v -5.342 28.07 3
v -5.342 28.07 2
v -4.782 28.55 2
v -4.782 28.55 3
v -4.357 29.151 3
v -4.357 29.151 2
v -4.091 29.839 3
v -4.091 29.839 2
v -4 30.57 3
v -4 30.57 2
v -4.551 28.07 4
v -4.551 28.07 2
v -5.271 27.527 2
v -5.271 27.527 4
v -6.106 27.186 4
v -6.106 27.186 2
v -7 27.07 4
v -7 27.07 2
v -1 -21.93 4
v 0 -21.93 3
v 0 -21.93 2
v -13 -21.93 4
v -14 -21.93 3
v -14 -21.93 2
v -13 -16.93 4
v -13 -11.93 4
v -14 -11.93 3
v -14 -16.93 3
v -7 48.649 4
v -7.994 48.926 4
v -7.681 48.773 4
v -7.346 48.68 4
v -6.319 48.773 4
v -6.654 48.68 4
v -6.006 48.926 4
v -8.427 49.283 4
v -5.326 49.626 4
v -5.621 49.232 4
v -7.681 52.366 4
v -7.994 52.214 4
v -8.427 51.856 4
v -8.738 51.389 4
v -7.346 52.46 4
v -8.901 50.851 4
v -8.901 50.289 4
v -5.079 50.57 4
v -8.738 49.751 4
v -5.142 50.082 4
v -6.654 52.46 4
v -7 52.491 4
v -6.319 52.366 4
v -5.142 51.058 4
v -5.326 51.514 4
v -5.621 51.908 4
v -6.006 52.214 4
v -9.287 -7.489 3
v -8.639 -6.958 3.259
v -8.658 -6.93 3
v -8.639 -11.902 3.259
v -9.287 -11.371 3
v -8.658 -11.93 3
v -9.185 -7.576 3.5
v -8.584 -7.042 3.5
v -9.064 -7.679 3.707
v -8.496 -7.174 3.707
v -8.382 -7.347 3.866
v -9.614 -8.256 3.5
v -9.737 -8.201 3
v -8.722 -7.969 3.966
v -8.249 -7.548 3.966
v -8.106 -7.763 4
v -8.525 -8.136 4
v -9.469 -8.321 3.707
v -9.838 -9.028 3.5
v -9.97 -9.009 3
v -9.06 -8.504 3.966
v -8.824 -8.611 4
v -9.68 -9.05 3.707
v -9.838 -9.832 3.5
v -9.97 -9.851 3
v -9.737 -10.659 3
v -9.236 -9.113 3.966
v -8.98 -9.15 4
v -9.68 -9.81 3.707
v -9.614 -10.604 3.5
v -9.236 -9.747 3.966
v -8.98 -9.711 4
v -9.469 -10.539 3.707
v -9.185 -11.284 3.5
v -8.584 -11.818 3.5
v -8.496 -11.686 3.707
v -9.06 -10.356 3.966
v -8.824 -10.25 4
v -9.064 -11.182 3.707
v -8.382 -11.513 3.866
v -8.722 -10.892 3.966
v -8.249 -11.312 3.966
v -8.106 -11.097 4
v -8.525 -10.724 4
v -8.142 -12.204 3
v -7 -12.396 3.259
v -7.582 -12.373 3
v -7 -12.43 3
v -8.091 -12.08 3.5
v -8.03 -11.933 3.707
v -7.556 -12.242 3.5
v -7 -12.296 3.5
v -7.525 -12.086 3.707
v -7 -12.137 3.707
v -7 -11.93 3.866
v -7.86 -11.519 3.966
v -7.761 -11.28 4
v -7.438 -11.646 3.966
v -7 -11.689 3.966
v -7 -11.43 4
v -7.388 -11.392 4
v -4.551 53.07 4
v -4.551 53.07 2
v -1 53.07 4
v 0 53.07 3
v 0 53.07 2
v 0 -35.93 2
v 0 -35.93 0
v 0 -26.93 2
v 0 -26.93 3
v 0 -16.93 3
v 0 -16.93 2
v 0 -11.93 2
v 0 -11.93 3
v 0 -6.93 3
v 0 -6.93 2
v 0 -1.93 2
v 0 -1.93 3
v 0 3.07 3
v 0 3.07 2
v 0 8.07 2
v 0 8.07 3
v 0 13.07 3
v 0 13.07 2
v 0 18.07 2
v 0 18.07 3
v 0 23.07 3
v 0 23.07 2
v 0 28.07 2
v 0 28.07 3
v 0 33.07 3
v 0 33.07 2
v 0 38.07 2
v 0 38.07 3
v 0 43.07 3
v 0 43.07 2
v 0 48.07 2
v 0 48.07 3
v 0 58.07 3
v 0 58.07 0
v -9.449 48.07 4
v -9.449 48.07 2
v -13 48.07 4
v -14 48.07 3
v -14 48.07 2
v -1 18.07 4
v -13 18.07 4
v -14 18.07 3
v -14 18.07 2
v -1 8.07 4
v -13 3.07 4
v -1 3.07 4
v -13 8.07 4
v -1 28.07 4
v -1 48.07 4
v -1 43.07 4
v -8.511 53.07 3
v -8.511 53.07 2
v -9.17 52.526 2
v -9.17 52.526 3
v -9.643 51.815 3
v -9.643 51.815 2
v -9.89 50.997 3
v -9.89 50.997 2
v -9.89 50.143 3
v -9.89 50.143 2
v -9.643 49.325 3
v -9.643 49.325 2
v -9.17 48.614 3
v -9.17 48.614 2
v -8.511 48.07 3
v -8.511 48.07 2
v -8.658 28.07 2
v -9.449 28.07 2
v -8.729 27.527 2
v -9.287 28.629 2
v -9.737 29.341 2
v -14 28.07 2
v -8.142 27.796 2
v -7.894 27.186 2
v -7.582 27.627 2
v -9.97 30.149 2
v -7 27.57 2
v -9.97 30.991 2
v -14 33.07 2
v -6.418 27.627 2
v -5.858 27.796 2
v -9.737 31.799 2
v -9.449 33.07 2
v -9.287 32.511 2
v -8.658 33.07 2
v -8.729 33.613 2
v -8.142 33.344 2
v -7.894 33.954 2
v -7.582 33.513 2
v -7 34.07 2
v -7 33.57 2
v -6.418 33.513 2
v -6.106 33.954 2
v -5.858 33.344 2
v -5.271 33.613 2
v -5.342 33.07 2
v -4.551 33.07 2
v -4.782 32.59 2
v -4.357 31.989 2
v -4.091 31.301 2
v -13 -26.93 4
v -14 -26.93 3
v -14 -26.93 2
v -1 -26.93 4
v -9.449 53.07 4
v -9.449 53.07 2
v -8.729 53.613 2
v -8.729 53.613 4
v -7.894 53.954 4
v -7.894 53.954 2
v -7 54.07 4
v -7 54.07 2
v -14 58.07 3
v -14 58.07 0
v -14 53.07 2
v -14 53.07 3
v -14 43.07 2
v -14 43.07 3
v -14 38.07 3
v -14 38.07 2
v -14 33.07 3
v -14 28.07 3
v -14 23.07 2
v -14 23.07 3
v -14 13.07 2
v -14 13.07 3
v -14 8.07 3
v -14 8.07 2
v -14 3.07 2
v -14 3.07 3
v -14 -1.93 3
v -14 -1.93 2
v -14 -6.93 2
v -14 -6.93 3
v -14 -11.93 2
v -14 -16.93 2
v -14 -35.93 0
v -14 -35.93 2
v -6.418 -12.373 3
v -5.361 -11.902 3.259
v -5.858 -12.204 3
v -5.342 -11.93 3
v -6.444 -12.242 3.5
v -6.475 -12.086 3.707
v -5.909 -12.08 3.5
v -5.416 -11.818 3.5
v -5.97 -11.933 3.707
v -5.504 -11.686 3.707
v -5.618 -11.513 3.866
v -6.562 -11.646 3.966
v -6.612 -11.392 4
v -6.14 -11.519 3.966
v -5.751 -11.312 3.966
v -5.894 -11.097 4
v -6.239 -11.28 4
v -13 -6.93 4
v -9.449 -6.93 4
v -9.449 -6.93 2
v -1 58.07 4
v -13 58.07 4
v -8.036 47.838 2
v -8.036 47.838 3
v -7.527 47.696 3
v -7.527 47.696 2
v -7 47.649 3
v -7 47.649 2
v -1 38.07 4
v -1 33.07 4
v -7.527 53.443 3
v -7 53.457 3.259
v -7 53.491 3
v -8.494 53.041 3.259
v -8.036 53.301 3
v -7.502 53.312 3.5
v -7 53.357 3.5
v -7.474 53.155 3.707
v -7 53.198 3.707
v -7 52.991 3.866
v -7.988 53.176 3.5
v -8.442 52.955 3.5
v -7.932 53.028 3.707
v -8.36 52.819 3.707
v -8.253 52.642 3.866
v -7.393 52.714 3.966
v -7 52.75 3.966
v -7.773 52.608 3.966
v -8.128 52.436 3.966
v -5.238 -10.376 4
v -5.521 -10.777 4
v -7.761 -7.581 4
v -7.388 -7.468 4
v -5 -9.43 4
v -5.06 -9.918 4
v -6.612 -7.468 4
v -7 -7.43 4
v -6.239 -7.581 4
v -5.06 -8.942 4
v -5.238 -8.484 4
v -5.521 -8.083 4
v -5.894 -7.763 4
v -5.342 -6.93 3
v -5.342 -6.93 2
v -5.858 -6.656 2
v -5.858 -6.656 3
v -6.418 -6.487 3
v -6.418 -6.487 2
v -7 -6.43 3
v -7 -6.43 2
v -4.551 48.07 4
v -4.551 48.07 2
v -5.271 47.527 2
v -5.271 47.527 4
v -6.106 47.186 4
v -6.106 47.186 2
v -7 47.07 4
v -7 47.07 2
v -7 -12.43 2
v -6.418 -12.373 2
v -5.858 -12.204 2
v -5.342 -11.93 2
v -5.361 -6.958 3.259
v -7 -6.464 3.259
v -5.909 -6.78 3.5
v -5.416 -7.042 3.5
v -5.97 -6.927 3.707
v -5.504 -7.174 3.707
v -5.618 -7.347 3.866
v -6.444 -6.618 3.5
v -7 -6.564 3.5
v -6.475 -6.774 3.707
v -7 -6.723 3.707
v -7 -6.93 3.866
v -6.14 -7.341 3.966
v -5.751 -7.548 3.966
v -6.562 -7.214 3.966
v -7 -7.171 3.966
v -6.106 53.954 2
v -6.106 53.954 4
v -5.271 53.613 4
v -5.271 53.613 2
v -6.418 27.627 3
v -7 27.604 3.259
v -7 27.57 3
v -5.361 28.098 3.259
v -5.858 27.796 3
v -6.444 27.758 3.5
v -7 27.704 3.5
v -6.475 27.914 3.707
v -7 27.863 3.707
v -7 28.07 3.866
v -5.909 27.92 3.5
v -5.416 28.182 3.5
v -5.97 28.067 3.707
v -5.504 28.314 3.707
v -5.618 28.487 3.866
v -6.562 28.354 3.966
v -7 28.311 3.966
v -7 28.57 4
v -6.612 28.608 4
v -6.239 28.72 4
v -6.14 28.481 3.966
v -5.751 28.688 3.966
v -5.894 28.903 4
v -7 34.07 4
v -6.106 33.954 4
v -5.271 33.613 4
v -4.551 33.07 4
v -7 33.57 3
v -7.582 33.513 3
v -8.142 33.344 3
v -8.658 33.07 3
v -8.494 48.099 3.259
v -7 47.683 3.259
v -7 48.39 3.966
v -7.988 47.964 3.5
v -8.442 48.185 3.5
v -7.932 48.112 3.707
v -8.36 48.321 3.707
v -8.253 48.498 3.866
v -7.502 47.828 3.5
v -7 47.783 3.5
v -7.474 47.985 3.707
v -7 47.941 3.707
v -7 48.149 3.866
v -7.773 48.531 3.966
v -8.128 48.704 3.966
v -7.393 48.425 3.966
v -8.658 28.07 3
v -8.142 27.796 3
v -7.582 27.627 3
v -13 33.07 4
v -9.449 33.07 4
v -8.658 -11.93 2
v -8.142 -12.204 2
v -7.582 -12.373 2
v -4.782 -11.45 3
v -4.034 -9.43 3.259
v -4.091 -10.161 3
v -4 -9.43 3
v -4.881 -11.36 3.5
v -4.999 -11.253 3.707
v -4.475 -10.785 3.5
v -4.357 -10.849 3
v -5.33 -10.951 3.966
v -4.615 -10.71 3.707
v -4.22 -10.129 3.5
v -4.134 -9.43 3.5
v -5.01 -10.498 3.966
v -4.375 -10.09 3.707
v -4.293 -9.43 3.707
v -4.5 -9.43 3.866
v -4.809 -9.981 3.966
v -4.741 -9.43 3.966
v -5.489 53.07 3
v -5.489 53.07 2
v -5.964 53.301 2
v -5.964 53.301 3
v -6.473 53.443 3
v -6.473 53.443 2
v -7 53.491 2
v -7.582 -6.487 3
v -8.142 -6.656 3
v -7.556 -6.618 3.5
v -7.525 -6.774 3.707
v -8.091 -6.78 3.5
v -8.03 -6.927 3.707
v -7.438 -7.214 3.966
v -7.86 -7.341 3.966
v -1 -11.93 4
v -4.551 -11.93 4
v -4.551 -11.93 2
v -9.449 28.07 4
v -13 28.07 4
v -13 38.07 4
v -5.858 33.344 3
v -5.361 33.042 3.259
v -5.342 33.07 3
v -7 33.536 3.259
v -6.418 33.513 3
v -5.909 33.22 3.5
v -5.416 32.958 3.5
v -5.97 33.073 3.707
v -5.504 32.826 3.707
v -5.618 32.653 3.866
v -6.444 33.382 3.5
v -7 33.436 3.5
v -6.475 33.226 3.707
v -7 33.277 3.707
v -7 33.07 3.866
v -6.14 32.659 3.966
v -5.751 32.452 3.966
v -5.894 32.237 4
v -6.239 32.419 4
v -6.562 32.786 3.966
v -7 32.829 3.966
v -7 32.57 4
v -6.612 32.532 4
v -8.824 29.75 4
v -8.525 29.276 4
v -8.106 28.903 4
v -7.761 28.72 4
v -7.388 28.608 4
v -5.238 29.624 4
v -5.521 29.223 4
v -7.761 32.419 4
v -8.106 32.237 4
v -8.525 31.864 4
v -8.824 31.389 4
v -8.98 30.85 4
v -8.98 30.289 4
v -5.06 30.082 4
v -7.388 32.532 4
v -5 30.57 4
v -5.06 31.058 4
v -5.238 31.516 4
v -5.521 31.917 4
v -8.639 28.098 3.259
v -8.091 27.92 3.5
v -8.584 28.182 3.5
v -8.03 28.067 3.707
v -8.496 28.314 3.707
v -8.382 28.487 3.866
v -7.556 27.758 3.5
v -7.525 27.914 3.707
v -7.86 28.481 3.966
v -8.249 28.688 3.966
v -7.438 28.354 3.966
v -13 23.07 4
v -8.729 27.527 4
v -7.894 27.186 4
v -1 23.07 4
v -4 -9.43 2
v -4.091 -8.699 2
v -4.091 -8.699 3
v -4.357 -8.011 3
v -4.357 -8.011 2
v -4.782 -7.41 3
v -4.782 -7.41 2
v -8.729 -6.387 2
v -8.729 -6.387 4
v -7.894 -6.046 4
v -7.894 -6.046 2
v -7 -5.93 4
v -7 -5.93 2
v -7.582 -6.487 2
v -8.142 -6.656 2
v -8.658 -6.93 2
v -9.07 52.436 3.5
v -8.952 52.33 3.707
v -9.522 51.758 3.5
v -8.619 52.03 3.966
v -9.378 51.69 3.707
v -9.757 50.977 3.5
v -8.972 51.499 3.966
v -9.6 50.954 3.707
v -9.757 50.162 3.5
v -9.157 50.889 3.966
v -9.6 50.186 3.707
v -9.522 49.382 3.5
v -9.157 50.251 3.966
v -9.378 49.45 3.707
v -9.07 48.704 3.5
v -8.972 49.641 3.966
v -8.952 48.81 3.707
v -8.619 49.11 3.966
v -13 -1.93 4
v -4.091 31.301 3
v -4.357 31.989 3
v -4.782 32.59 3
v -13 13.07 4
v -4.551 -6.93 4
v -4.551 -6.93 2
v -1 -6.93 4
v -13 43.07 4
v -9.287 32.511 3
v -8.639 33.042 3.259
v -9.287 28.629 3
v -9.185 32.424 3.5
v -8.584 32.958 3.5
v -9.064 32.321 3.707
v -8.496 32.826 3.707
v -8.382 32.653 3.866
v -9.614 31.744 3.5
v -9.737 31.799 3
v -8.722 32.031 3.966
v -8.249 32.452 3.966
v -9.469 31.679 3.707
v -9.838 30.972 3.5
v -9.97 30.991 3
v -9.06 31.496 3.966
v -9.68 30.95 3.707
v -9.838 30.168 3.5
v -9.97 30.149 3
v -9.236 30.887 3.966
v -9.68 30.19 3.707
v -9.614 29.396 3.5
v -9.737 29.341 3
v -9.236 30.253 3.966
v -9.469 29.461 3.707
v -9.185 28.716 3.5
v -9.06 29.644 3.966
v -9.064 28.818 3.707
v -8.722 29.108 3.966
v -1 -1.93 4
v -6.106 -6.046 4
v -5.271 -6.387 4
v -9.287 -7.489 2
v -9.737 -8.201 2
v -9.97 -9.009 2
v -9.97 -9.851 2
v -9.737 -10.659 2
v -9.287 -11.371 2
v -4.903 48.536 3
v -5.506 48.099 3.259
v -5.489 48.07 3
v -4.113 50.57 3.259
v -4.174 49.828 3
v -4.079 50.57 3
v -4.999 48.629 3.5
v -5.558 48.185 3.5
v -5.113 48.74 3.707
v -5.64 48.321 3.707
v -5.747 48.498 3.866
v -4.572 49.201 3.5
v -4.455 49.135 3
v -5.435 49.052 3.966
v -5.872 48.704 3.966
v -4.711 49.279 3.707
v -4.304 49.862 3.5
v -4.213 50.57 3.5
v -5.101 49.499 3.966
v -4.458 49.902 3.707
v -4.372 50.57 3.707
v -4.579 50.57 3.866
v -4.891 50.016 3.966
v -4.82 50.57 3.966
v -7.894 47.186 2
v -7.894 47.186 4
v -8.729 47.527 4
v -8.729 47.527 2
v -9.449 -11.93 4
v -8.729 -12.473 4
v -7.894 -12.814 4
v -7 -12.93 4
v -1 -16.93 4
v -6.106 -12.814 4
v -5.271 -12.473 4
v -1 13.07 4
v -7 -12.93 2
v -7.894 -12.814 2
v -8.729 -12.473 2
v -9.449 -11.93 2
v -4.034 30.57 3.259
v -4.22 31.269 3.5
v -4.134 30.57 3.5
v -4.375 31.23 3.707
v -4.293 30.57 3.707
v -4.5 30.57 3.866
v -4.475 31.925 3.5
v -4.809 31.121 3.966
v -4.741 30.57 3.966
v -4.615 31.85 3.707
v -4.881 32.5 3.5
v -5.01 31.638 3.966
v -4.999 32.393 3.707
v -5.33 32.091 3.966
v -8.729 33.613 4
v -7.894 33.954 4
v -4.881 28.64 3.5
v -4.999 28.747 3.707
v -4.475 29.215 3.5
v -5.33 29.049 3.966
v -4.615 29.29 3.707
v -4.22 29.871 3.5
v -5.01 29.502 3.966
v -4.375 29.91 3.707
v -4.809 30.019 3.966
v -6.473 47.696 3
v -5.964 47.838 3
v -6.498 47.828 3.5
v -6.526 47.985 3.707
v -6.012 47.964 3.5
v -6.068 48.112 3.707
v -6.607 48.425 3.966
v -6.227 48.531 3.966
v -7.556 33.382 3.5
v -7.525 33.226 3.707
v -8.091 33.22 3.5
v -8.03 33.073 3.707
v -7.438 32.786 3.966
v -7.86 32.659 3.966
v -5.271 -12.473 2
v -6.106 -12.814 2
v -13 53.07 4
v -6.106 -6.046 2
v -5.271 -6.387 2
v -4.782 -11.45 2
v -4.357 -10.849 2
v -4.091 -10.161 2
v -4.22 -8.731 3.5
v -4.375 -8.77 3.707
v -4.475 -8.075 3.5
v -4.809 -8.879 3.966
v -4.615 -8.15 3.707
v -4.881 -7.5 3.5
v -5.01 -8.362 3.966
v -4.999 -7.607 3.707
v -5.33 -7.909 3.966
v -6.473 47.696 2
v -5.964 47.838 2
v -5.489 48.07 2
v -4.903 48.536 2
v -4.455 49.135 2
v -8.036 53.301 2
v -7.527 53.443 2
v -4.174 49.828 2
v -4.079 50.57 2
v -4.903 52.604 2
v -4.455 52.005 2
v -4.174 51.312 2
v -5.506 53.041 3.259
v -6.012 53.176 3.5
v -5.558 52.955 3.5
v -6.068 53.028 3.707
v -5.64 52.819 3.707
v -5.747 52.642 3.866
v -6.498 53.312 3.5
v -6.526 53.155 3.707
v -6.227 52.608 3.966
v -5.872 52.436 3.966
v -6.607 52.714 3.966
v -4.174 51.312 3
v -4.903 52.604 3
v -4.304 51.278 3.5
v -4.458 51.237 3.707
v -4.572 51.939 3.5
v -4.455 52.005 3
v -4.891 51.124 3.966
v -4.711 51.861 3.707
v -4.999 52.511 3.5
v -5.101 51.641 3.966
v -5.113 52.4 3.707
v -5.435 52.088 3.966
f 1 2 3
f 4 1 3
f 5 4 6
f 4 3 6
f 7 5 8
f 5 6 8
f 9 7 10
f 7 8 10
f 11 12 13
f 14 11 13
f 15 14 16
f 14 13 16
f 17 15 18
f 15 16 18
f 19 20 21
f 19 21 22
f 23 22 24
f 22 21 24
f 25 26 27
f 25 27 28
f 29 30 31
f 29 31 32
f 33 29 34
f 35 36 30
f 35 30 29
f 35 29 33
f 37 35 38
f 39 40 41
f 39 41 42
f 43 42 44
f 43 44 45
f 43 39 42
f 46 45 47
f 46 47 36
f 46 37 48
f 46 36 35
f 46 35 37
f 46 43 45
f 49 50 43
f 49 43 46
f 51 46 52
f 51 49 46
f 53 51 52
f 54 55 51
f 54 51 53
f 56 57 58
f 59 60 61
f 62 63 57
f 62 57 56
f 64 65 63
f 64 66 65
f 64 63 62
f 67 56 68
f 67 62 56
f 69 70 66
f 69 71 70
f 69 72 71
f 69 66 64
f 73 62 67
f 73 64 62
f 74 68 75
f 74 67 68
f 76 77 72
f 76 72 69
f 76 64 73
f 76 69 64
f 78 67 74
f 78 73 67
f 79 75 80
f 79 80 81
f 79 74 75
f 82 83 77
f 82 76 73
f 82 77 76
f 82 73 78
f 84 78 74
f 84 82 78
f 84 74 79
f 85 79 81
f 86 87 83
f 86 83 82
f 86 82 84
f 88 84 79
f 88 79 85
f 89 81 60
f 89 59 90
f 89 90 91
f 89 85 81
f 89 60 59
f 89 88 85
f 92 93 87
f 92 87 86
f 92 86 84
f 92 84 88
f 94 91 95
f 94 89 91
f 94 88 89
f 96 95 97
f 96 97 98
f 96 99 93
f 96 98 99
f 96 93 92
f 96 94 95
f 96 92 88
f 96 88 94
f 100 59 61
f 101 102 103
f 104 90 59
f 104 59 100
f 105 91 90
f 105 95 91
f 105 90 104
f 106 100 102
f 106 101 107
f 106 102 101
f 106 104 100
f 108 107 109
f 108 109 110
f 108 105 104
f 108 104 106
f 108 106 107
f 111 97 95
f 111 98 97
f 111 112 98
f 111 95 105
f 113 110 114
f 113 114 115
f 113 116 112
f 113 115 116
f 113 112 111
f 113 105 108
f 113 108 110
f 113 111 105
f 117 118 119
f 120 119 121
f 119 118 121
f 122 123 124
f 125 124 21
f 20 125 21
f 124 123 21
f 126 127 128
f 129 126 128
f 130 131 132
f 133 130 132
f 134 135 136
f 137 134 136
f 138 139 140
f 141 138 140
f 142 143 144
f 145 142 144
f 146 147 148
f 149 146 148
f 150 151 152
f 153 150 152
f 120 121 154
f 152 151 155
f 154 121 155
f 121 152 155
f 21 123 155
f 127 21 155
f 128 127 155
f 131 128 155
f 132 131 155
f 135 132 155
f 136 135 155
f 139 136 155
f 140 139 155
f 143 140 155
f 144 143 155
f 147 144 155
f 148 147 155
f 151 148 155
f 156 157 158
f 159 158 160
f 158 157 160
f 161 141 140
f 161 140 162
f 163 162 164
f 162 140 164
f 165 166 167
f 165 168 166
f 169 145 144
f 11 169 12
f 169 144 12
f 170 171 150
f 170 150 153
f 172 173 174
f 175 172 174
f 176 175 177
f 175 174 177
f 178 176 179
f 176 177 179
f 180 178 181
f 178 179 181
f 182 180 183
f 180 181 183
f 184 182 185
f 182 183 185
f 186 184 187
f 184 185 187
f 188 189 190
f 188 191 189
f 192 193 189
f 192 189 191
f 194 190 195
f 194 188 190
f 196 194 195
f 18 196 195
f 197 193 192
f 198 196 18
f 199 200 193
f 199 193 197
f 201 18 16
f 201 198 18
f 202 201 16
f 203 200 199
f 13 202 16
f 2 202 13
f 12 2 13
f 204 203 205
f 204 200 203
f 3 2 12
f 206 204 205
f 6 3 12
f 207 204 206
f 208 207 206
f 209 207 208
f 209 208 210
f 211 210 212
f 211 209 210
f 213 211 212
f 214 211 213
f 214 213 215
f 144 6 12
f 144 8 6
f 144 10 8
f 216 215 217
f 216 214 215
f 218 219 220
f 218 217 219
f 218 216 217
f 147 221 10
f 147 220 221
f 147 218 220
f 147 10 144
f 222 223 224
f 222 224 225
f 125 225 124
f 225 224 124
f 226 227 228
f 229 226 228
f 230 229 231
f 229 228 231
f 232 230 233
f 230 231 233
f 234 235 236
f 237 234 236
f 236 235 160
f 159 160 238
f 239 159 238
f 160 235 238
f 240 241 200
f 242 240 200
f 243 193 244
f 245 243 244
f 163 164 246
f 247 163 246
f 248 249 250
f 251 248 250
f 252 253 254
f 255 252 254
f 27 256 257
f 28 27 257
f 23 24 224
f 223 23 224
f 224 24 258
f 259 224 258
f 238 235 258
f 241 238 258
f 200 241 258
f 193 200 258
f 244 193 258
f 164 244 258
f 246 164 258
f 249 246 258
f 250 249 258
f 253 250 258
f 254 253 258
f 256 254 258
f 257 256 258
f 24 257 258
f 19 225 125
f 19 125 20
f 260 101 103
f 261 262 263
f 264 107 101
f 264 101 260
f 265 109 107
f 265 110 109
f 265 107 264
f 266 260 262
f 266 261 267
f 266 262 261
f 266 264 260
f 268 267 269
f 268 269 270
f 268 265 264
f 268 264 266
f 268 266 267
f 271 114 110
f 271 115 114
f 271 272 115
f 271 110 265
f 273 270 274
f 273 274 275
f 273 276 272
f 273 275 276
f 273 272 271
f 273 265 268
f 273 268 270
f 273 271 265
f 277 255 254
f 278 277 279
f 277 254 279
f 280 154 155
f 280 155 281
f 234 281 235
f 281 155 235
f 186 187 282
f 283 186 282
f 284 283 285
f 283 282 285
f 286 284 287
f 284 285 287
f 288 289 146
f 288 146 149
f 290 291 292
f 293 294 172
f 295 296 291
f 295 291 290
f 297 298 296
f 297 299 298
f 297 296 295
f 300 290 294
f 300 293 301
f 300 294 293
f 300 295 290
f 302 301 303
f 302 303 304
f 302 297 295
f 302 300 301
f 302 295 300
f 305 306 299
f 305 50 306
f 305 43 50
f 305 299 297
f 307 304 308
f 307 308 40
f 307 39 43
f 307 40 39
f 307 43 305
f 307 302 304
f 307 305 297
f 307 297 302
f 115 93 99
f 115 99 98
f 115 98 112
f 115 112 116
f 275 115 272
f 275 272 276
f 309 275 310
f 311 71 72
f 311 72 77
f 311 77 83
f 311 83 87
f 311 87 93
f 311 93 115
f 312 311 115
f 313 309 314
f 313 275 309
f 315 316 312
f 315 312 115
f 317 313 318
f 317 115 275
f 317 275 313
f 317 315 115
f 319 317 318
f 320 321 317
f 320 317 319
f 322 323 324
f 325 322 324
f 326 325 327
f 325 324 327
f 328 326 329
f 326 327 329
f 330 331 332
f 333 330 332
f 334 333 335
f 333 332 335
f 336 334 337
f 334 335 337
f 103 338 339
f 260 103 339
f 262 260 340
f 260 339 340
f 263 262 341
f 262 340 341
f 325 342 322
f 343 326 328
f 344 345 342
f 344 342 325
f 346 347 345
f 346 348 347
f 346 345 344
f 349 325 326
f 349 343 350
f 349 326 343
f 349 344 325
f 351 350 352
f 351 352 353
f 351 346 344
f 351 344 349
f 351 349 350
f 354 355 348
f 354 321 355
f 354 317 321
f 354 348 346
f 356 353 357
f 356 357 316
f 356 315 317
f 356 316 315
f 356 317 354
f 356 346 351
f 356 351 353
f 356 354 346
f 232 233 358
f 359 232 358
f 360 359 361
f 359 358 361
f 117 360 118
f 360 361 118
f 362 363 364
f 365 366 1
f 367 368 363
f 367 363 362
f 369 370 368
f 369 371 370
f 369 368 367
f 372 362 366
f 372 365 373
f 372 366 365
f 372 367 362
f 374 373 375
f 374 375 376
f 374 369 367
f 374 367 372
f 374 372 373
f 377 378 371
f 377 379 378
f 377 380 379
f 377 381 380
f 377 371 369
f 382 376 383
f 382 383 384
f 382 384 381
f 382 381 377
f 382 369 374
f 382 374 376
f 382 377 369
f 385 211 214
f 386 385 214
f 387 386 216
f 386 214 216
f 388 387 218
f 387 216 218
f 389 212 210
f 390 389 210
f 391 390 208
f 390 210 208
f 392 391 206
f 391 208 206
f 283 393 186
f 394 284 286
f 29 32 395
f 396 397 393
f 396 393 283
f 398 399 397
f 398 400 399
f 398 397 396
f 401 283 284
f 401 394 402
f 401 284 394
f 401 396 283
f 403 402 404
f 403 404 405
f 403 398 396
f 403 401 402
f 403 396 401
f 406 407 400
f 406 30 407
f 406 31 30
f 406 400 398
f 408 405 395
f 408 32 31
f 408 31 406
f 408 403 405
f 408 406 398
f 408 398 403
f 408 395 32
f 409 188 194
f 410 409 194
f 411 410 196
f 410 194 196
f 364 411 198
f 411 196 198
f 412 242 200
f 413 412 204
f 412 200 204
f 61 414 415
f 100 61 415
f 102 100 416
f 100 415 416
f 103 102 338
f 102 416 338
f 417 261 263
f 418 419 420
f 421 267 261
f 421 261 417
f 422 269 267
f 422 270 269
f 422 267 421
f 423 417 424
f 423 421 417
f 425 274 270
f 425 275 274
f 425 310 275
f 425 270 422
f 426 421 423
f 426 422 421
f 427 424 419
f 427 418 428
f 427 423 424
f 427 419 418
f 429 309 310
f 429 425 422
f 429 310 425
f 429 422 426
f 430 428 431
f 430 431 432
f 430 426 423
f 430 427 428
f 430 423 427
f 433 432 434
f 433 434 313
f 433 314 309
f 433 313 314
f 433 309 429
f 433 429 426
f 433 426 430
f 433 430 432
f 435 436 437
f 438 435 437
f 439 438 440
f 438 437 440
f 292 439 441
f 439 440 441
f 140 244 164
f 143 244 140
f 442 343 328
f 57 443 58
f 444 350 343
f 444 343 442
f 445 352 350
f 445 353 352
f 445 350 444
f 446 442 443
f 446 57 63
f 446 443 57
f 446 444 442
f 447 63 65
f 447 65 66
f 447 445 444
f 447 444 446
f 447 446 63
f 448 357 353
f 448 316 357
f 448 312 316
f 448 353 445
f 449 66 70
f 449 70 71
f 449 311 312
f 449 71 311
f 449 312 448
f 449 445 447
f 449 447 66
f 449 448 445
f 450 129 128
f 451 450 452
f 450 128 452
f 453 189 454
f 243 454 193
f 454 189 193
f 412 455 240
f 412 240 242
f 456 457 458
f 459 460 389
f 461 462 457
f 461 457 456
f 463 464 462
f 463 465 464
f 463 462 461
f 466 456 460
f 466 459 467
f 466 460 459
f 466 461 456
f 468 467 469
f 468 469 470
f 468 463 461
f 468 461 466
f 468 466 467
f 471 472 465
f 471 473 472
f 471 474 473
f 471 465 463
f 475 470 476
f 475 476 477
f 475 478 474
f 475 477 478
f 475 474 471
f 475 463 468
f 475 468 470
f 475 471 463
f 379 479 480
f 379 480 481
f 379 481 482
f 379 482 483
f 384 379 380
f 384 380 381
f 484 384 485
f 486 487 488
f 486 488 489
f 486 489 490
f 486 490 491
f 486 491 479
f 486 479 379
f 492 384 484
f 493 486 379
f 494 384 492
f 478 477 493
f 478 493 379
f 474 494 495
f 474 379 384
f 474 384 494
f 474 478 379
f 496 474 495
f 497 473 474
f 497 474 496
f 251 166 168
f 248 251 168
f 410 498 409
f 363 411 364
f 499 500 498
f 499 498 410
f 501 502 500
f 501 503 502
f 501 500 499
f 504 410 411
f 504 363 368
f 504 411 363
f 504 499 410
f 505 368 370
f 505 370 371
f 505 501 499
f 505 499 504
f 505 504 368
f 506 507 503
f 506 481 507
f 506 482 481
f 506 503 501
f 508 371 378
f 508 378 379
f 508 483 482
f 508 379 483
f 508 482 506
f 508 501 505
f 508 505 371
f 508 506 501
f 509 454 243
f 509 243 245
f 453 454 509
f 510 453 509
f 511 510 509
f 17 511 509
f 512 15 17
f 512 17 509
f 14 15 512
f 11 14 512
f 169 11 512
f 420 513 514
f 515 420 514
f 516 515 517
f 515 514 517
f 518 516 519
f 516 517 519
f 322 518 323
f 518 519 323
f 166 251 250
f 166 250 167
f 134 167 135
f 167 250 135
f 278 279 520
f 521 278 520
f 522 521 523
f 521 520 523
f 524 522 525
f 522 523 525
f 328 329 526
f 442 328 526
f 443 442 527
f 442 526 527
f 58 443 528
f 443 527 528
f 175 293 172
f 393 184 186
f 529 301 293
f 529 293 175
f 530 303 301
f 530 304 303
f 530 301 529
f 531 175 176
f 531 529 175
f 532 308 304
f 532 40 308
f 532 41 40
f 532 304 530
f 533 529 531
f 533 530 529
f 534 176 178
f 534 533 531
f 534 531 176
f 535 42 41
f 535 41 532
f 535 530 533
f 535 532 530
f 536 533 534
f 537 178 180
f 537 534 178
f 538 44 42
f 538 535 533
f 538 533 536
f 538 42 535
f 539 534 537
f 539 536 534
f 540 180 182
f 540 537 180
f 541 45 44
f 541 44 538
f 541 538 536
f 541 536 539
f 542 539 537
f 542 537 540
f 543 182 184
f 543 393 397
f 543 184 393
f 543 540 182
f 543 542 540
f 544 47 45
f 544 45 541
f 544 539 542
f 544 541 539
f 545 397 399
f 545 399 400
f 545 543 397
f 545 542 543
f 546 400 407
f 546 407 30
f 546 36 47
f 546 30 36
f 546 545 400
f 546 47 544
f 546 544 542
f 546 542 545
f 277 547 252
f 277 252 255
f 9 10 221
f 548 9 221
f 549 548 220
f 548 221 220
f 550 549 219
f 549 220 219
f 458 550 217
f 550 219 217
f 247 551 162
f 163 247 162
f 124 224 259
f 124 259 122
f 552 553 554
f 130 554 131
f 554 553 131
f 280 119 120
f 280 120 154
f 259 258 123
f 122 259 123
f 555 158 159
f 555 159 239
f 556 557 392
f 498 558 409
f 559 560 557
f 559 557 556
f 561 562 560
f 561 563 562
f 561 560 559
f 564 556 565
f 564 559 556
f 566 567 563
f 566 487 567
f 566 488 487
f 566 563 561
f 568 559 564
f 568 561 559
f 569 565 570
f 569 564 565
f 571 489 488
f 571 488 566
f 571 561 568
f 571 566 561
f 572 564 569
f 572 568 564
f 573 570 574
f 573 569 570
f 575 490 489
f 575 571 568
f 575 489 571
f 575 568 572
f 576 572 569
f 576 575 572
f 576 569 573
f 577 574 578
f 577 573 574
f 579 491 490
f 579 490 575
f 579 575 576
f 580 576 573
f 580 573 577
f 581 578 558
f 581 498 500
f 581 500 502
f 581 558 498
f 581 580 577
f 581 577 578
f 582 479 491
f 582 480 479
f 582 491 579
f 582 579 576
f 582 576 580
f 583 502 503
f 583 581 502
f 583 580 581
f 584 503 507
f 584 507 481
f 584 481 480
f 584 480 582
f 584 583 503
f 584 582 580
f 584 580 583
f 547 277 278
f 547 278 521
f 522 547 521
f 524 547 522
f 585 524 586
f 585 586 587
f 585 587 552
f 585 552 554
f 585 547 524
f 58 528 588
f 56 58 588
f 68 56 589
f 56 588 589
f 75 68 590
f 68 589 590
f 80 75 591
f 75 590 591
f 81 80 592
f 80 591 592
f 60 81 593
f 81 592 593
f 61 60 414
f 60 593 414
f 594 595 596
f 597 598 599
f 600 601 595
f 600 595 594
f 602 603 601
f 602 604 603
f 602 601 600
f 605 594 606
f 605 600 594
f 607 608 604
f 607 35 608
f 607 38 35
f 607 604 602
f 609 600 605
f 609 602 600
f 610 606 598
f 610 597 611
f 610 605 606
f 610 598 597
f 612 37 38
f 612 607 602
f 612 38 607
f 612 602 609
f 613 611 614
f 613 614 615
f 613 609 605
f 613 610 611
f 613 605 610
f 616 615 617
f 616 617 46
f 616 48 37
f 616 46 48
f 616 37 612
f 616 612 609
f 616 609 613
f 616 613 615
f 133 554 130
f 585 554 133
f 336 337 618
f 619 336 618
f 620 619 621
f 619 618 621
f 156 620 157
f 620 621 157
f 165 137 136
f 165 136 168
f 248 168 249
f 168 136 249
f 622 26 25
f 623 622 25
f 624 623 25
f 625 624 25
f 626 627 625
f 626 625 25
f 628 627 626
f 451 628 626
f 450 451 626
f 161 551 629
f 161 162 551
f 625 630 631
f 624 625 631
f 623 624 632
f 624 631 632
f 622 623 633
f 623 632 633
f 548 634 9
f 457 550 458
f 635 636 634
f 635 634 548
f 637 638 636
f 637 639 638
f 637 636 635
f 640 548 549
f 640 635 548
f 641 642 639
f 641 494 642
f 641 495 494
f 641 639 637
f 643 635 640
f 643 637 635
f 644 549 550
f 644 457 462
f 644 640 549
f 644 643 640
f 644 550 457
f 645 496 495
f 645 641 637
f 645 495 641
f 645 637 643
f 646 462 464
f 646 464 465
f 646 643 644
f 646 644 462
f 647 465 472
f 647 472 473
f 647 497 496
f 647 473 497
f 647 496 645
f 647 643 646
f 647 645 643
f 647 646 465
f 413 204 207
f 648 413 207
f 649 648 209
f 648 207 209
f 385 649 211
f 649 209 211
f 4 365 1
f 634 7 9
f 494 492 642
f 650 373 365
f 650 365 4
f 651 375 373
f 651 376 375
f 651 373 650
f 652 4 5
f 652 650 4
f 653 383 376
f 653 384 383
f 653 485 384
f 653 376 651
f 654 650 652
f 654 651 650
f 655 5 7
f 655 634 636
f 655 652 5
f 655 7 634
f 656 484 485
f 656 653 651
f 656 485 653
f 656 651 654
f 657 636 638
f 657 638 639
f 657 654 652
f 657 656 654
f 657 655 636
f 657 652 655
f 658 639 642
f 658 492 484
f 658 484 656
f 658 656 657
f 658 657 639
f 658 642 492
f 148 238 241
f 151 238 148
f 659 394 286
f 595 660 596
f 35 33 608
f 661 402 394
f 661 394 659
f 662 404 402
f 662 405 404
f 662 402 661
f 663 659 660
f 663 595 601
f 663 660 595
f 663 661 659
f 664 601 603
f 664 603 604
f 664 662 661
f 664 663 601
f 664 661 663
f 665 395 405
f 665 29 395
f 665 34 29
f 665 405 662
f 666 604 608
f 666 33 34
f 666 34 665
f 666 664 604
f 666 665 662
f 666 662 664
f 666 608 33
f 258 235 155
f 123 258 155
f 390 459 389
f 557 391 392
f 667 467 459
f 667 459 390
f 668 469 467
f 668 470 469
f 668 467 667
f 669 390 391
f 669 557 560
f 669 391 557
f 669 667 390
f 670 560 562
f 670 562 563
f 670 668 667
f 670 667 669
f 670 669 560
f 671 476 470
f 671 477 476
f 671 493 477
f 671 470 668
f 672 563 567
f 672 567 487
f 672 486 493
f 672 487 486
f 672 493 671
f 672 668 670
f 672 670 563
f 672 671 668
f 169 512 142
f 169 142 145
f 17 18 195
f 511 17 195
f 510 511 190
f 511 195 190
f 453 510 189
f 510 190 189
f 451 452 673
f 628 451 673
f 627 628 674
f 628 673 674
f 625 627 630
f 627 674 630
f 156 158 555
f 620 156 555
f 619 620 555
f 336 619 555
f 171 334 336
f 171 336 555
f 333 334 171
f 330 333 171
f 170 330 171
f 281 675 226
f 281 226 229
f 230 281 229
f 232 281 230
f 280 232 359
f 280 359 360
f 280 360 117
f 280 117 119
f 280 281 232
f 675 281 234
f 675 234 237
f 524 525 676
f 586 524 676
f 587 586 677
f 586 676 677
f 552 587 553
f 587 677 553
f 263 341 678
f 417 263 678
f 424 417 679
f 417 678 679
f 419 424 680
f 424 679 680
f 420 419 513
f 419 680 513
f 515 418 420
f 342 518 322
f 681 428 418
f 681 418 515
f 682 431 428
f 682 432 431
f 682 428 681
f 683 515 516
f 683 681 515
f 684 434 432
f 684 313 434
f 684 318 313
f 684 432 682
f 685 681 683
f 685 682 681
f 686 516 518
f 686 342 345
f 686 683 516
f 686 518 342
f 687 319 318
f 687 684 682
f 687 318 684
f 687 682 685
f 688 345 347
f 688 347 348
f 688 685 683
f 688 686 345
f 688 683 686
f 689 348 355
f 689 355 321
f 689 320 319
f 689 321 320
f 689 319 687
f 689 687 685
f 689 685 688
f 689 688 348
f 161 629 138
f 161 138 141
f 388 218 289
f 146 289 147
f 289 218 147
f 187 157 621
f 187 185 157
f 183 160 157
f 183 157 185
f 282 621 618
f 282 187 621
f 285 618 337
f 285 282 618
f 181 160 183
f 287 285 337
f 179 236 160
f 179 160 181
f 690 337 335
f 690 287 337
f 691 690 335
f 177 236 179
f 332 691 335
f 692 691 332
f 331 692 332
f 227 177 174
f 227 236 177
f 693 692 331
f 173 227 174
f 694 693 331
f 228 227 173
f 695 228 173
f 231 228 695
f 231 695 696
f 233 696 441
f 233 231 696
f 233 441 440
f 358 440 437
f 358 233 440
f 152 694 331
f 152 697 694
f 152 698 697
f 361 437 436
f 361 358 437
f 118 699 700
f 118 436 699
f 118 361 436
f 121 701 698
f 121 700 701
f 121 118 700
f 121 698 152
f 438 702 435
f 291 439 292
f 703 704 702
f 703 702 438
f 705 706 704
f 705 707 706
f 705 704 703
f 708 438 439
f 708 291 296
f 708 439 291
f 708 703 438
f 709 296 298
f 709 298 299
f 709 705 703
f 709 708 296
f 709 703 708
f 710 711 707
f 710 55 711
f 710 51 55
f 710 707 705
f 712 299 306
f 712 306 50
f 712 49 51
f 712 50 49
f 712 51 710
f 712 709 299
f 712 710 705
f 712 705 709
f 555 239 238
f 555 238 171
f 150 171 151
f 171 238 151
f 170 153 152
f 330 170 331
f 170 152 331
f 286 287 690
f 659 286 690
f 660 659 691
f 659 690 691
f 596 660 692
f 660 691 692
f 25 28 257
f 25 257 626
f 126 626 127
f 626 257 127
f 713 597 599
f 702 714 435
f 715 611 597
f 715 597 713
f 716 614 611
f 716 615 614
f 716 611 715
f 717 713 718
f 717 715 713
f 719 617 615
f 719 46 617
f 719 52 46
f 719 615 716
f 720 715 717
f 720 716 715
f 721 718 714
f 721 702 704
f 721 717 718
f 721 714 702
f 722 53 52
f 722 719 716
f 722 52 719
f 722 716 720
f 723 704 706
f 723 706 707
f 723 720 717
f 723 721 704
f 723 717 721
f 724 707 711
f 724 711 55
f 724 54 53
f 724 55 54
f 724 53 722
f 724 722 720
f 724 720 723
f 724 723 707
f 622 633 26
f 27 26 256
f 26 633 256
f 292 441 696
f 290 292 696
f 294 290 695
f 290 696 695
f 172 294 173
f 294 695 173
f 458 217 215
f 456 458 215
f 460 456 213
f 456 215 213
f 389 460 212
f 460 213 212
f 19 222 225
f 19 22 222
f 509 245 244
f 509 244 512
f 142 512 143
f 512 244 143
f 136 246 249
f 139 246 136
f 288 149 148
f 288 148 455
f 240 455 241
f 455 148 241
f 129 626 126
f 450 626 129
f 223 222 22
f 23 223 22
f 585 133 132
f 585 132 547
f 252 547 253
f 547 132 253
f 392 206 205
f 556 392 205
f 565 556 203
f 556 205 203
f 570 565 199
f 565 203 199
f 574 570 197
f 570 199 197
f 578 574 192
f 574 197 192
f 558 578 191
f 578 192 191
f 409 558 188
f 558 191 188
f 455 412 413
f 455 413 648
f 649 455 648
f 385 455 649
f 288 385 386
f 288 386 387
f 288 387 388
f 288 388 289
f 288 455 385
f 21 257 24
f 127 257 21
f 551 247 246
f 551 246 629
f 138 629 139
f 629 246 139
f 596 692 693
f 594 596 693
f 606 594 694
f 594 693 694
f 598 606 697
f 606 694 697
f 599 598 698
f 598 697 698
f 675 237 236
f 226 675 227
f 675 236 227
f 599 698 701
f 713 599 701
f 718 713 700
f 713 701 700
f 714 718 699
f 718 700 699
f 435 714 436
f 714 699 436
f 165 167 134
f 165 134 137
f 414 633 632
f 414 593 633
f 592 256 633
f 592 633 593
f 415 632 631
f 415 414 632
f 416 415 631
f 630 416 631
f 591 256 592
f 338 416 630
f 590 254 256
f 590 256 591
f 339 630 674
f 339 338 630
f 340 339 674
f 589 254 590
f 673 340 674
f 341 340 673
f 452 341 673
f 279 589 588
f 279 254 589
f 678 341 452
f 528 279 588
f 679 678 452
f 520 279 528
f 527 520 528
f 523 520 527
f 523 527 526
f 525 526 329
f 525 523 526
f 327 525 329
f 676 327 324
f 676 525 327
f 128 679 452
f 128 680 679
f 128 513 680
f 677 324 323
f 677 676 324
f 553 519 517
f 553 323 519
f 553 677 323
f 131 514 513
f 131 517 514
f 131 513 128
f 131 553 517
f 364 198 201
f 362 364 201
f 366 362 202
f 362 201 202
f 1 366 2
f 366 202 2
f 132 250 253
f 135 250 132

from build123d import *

# Parameters (mm, degrees)
F0_W     = 14
F0_H     = 94
F1_DEPTH = 2
F2_W     = 7
F2_H     = 5
F3_DEPTH = 2
F4_SIZE  = 1
F5_R     = 1


with BuildPart() as f1:
    # F0 (on Top) → F1 (new body)
    with BuildSketch(Plane.XY):
        with Locations((-7, 11.0699324605)):
            Rectangle(F0_W, F0_H)
    extrude(amount=F1_DEPTH)

    # F2 (on face) → F3 (join)
    with BuildSketch(Plane.XY.offset(2)):
        with BuildLine():
            Line((-7, 58.0699324605), (-14, 58.0699324605))
            Line((-14, 58.0699324605), (-14, 53.0699324605))
            Line((-14, 53.0699324605), (-9.4494897428, 53.0699324605))
            ThreePointArc((-9.4494897428, 53.0699324605), (-8.3228756555, 53.8103028097), (-7, 54.0699324605))
            Line((-7, 54.0699324605), (-7, 58.0699324605))
        make_face()
        with BuildLine():
            Line((0, 58.0699324605), (-7, 58.0699324605))
            Line((-7, 58.0699324605), (-7, 54.0699324605))
            ThreePointArc((-7, 54.0699324605), (-5.6771243445, 53.8103028097), (-4.5505102572, 53.0699324605))
            Line((-4.5505102572, 53.0699324605), (0, 53.0699324605))
            Line((0, 53.0699324605), (0, 58.0699324605))
        make_face()
        with BuildLine():
            Line((-9.4494897428, 48.0699324605), (-14, 48.0699324605))
            Line((-14, 48.0699324605), (-14, 43.0699324605))
            Line((-14, 43.0699324605), (-7, 43.0699324605))
            Line((-7, 43.0699324605), (-7, 47.0699324605))
            ThreePointArc((-7, 47.0699324605), (-8.3228756555, 47.3295621113), (-9.4494897428, 48.0699324605))
        make_face()
        with BuildLine():
            ThreePointArc((-4.5505102572, 48.0699324605), (-5.6771243445, 47.3295621113), (-7, 47.0699324605))
            Line((-7, 47.0699324605), (-7, 43.0699324605))
            Line((-7, 43.0699324605), (0, 43.0699324605))
            Line((0, 43.0699324605), (0, 48.0699324605))
            Line((0, 48.0699324605), (-4.5505102572, 48.0699324605))
        make_face()
        with BuildLine():
            Line((0, 38.0699324605), (-7, 38.0699324605))
            Line((-7, 38.0699324605), (-7, 34.0699324605))
            ThreePointArc((-7, 34.0699324605), (-5.6771243445, 33.8103028097), (-4.5505102572, 33.0699324605))
            Line((-4.5505102572, 33.0699324605), (0, 33.0699324605))
            Line((0, 33.0699324605), (0, 38.0699324605))
        make_face()
        with BuildLine():
            Line((-7, 38.0699324605), (-14, 38.0699324605))
            Line((-14, 38.0699324605), (-14, 33.0699324605))
            Line((-14, 33.0699324605), (-9.4494897428, 33.0699324605))
            ThreePointArc((-9.4494897428, 33.0699324605), (-8.3228756555, 33.8103028097), (-7, 34.0699324605))
            Line((-7, 34.0699324605), (-7, 38.0699324605))
        make_face()
        with BuildLine():
            Line((-9.4494897428, 28.0699324605), (-14, 28.0699324605))
            Line((-14, 28.0699324605), (-14, 23.0699324605))
            Line((-14, 23.0699324605), (-7, 23.0699324605))
            Line((-7, 23.0699324605), (-7, 27.0699324605))
            ThreePointArc((-7, 27.0699324605), (-8.3228756555, 27.3295621113), (-9.4494897428, 28.0699324605))
        make_face()
        with BuildLine():
            Line((0, 23.0699324605), (0, 28.0699324605))
            Line((0, 28.0699324605), (-4.5505102572, 28.0699324605))
            ThreePointArc((-4.5505102572, 28.0699324605), (-5.6771243445, 27.3295621113), (-7, 27.0699324605))
            Line((-7, 27.0699324605), (-7, 23.0699324605))
            Line((-7, 23.0699324605), (0, 23.0699324605))
        make_face()
        with Locations((-10.5, 15.5699324605)):
            Rectangle(F2_W, F2_H)
        with Locations((-3.5, 15.5699324605)):
            Rectangle(F2_W, F2_H)
        with Locations((-10.5, 5.5699324605)):
            Rectangle(F2_W, F2_H)
        with Locations((-3.5, 5.5699324605)):
            Rectangle(F2_W, F2_H)
        with BuildLine():
            Line((-7, -1.9300675395), (-14, -1.9300675395))
            Line((-14, -1.9300675395), (-14, -6.9300675395))
            Line((-14, -6.9300675395), (-9.4494897428, -6.9300675395))
            ThreePointArc((-9.4494897428, -6.9300675395), (-8.3228756555, -6.1896971903), (-7, -5.9300675395))
            Line((-7, -5.9300675395), (-7, -1.9300675395))
        make_face()
        with BuildLine():
            Line((0, -1.9300675395), (-7, -1.9300675395))
            Line((-7, -1.9300675395), (-7, -5.9300675395))
            ThreePointArc((-7, -5.9300675395), (-5.6771243445, -6.1896971903), (-4.5505102572, -6.9300675395))
            Line((-4.5505102572, -6.9300675395), (0, -6.9300675395))
            Line((0, -6.9300675395), (0, -1.9300675395))
        make_face()
        with BuildLine():
            Line((-9.4494897428, -11.9300675395), (-14, -11.9300675395))
            Line((-14, -11.9300675395), (-14, -16.9300675395))
            Line((-14, -16.9300675395), (-7, -16.9300675395))
            Line((-7, -16.9300675395), (-7, -12.9300675395))
            ThreePointArc((-7, -12.9300675395), (-8.3228756555, -12.6704378887), (-9.4494897428, -11.9300675395))
        make_face()
        with BuildLine():
            Line((0, -16.9300675395), (0, -11.9300675395))
            Line((0, -11.9300675395), (-4.5505102572, -11.9300675395))
            ThreePointArc((-4.5505102572, -11.9300675395), (-5.6771243445, -12.6704378887), (-7, -12.9300675395))
            Line((-7, -12.9300675395), (-7, -16.9300675395))
            Line((-7, -16.9300675395), (0, -16.9300675395))
        make_face()
        with Locations((-10.5, -24.4300675395)):
            Rectangle(F2_W, F2_H)
        with Locations((-3.5, -24.4300675395)):
            Rectangle(F2_W, F2_H)
        with BuildLine():
            Line((-7, 53.0699324605), (-8.5114243945, 53.0699324605))
            ThreePointArc((-8.5114243945, 53.0699324605), (-9.9213701751, 50.5699324605), (-8.5114243945, 48.0699324605))
            Line((-8.5114243945, 48.0699324605), (-7, 48.0699324605))
            Line((-7, 48.0699324605), (-7, 53.0699324605))
        make_face()
        with BuildLine():
            Line((-5.4885756055, 53.0699324605), (-7, 53.0699324605))
            Line((-7, 53.0699324605), (-7, 48.0699324605))
            Line((-7, 48.0699324605), (-5.4885756055, 48.0699324605))
            ThreePointArc((-5.4885756055, 48.0699324605), (-4.455414194, 49.1348412522), (-4.0786298249, 50.5699324605))
            ThreePointArc((-4.0786298249, 50.5699324605), (-4.455414194, 52.0050236688), (-5.4885756055, 53.0699324605))
        make_face()
        with BuildLine():
            ThreePointArc((-5.4885756055, 53.0699324605), (-6.2154688463, 53.3839890642), (-7, 53.4913026356))
            Line((-7, 53.4913026356), (-7, 53.0699324605))
            Line((-7, 53.0699324605), (-5.4885756055, 53.0699324605))
        make_face()
        with BuildLine():
            ThreePointArc((-7, 53.4913026356), (-7.7845311537, 53.3839890642), (-8.5114243945, 53.0699324605))
            Line((-8.5114243945, 53.0699324605), (-7, 53.0699324605))
            Line((-7, 53.0699324605), (-7, 53.4913026356))
        make_face()
        with BuildLine():
            Line((-7, 48.0699324605), (-8.5114243945, 48.0699324605))
            ThreePointArc((-8.5114243945, 48.0699324605), (-7.7845311537, 47.7558758567), (-7, 47.6485622853))
            Line((-7, 47.6485622853), (-7, 48.0699324605))
        make_face()
        with BuildLine():
            Line((-5.4885756055, 48.0699324605), (-7, 48.0699324605))
            Line((-7, 48.0699324605), (-7, 47.6485622853))
            ThreePointArc((-7, 47.6485622853), (-6.2154688463, 47.7558758567), (-5.4885756055, 48.0699324605))
        make_face()
        with BuildLine():
            Line((-7, 33.0699324605), (-7, 33.5699324605))
            ThreePointArc((-7, 33.5699324605), (-7.8660254038, 33.4422137837), (-8.6583123952, 33.0699324605))
            Line((-8.6583123952, 33.0699324605), (-7, 33.0699324605))
        make_face()
        with BuildLine():
            ThreePointArc((-5.3416876048, 33.0699324605), (-6.1339745962, 33.4422137837), (-7, 33.5699324605))
            Line((-7, 33.5699324605), (-7, 33.0699324605))
            Line((-7, 33.0699324605), (-5.3416876048, 33.0699324605))
        make_face()
        with BuildLine():
            Line((-5.3416876048, 33.0699324605), (-7, 33.0699324605))
            Line((-7, 33.0699324605), (-7, 28.0699324605))
            Line((-7, 28.0699324605), (-5.3416876048, 28.0699324605))
            ThreePointArc((-5.3416876048, 28.0699324605), (-4.3566179631, 29.151295295), (-4, 30.5699324605))
            ThreePointArc((-4, 30.5699324605), (-4.3566179631, 31.9885696259), (-5.3416876048, 33.0699324605))
        make_face()
        with BuildLine():
            Line((-7, 33.0699324605), (-8.6583123952, 33.0699324605))
            ThreePointArc((-8.6583123952, 33.0699324605), (-10, 30.5699324605), (-8.6583123952, 28.0699324605))
            Line((-8.6583123952, 28.0699324605), (-7, 28.0699324605))
            Line((-7, 28.0699324605), (-7, 33.0699324605))
        make_face()
        with BuildLine():
            Line((-7, 28.0699324605), (-8.6583123952, 28.0699324605))
            ThreePointArc((-8.6583123952, 28.0699324605), (-7.8660254038, 27.6976511372), (-7, 27.5699324605))
            Line((-7, 27.5699324605), (-7, 28.0699324605))
        make_face()
        with BuildLine():
            Line((-5.3416876048, 28.0699324605), (-7, 28.0699324605))
            Line((-7, 28.0699324605), (-7, 27.5699324605))
            ThreePointArc((-7, 27.5699324605), (-6.1339745962, 27.6976511372), (-5.3416876048, 28.0699324605))
        make_face()
        with BuildLine():
            Line((-7, -6.9300675395), (-7, -6.4300675395))
            ThreePointArc((-7, -6.4300675395), (-7.8660254038, -6.5577862163), (-8.6583123952, -6.9300675395))
            Line((-8.6583123952, -6.9300675395), (-7, -6.9300675395))
        make_face()
        with BuildLine():
            ThreePointArc((-5.3416876048, -6.9300675395), (-6.1339745962, -6.5577862163), (-7, -6.4300675395))
            Line((-7, -6.4300675395), (-7, -6.9300675395))
            Line((-7, -6.9300675395), (-5.3416876048, -6.9300675395))
        make_face()
        with BuildLine():
            Line((-5.3416876048, -6.9300675395), (-7, -6.9300675395))
            Line((-7, -6.9300675395), (-7, -11.9300675395))
            Line((-7, -11.9300675395), (-5.3416876048, -11.9300675395))
            ThreePointArc((-5.3416876048, -11.9300675395), (-4.3566179631, -10.848704705), (-4, -9.4300675395))
            ThreePointArc((-4, -9.4300675395), (-4.3566179631, -8.0114303741), (-5.3416876048, -6.9300675395))
        make_face()
        with BuildLine():
            Line((-7, -6.9300675395), (-8.6583123952, -6.9300675395))
            ThreePointArc((-8.6583123952, -6.9300675395), (-10, -9.4300675395), (-8.6583123952, -11.9300675395))
            Line((-8.6583123952, -11.9300675395), (-7, -11.9300675395))
            Line((-7, -11.9300675395), (-7, -6.9300675395))
        make_face()
        with BuildLine():
            Line((-7, -11.9300675395), (-8.6583123952, -11.9300675395))
            ThreePointArc((-8.6583123952, -11.9300675395), (-7.8660254038, -12.3023488628), (-7, -12.4300675395))
            Line((-7, -12.4300675395), (-7, -11.9300675395))
        make_face()
        with BuildLine():
            Line((-5.3416876048, -11.9300675395), (-7, -11.9300675395))
            Line((-7, -11.9300675395), (-7, -12.4300675395))
            ThreePointArc((-7, -12.4300675395), (-6.1339745962, -12.3023488628), (-5.3416876048, -11.9300675395))
        make_face()
    extrude(amount=F3_DEPTH)

    # F4
    f4_edges = [f1.edges().sort_by_distance(p)[0] for p in [
        (-14, 55.569932, 4),
        (-14, 45.569932, 4),
        (-14, 35.569932, 4),
        (-14, 25.569932, 4),
        (-14, 15.569932, 4),
        (-14, 5.569932, 4),
        (-14, -4.430068, 4),
        (-14, -14.430068, 4),
        (-14, -24.430068, 4),
        (0, -24.430068, 4),
        (0, -14.430068, 4),
        (0, -4.430068, 4),
        (0, 5.569932, 4),
        (0, 15.569932, 4),
        (0, 25.569932, 4),
        (0, 35.569932, 4),
        (0, 45.569932, 4),
        (0, 55.569932, 4),
    ]]
    chamfer(f4_edges, length=F4_SIZE)

    # F5
    f5_edges = [f1.edges().sort_by_distance(p)[0] for p in [
        (-5.341688, -11.930068, 4),
        (-5.341688, 28.069932, 4),
        (-5.488576, 53.069932, 4),
    ]]
    fillet(f5_edges, radius=F5_R)


solid = f1.part
